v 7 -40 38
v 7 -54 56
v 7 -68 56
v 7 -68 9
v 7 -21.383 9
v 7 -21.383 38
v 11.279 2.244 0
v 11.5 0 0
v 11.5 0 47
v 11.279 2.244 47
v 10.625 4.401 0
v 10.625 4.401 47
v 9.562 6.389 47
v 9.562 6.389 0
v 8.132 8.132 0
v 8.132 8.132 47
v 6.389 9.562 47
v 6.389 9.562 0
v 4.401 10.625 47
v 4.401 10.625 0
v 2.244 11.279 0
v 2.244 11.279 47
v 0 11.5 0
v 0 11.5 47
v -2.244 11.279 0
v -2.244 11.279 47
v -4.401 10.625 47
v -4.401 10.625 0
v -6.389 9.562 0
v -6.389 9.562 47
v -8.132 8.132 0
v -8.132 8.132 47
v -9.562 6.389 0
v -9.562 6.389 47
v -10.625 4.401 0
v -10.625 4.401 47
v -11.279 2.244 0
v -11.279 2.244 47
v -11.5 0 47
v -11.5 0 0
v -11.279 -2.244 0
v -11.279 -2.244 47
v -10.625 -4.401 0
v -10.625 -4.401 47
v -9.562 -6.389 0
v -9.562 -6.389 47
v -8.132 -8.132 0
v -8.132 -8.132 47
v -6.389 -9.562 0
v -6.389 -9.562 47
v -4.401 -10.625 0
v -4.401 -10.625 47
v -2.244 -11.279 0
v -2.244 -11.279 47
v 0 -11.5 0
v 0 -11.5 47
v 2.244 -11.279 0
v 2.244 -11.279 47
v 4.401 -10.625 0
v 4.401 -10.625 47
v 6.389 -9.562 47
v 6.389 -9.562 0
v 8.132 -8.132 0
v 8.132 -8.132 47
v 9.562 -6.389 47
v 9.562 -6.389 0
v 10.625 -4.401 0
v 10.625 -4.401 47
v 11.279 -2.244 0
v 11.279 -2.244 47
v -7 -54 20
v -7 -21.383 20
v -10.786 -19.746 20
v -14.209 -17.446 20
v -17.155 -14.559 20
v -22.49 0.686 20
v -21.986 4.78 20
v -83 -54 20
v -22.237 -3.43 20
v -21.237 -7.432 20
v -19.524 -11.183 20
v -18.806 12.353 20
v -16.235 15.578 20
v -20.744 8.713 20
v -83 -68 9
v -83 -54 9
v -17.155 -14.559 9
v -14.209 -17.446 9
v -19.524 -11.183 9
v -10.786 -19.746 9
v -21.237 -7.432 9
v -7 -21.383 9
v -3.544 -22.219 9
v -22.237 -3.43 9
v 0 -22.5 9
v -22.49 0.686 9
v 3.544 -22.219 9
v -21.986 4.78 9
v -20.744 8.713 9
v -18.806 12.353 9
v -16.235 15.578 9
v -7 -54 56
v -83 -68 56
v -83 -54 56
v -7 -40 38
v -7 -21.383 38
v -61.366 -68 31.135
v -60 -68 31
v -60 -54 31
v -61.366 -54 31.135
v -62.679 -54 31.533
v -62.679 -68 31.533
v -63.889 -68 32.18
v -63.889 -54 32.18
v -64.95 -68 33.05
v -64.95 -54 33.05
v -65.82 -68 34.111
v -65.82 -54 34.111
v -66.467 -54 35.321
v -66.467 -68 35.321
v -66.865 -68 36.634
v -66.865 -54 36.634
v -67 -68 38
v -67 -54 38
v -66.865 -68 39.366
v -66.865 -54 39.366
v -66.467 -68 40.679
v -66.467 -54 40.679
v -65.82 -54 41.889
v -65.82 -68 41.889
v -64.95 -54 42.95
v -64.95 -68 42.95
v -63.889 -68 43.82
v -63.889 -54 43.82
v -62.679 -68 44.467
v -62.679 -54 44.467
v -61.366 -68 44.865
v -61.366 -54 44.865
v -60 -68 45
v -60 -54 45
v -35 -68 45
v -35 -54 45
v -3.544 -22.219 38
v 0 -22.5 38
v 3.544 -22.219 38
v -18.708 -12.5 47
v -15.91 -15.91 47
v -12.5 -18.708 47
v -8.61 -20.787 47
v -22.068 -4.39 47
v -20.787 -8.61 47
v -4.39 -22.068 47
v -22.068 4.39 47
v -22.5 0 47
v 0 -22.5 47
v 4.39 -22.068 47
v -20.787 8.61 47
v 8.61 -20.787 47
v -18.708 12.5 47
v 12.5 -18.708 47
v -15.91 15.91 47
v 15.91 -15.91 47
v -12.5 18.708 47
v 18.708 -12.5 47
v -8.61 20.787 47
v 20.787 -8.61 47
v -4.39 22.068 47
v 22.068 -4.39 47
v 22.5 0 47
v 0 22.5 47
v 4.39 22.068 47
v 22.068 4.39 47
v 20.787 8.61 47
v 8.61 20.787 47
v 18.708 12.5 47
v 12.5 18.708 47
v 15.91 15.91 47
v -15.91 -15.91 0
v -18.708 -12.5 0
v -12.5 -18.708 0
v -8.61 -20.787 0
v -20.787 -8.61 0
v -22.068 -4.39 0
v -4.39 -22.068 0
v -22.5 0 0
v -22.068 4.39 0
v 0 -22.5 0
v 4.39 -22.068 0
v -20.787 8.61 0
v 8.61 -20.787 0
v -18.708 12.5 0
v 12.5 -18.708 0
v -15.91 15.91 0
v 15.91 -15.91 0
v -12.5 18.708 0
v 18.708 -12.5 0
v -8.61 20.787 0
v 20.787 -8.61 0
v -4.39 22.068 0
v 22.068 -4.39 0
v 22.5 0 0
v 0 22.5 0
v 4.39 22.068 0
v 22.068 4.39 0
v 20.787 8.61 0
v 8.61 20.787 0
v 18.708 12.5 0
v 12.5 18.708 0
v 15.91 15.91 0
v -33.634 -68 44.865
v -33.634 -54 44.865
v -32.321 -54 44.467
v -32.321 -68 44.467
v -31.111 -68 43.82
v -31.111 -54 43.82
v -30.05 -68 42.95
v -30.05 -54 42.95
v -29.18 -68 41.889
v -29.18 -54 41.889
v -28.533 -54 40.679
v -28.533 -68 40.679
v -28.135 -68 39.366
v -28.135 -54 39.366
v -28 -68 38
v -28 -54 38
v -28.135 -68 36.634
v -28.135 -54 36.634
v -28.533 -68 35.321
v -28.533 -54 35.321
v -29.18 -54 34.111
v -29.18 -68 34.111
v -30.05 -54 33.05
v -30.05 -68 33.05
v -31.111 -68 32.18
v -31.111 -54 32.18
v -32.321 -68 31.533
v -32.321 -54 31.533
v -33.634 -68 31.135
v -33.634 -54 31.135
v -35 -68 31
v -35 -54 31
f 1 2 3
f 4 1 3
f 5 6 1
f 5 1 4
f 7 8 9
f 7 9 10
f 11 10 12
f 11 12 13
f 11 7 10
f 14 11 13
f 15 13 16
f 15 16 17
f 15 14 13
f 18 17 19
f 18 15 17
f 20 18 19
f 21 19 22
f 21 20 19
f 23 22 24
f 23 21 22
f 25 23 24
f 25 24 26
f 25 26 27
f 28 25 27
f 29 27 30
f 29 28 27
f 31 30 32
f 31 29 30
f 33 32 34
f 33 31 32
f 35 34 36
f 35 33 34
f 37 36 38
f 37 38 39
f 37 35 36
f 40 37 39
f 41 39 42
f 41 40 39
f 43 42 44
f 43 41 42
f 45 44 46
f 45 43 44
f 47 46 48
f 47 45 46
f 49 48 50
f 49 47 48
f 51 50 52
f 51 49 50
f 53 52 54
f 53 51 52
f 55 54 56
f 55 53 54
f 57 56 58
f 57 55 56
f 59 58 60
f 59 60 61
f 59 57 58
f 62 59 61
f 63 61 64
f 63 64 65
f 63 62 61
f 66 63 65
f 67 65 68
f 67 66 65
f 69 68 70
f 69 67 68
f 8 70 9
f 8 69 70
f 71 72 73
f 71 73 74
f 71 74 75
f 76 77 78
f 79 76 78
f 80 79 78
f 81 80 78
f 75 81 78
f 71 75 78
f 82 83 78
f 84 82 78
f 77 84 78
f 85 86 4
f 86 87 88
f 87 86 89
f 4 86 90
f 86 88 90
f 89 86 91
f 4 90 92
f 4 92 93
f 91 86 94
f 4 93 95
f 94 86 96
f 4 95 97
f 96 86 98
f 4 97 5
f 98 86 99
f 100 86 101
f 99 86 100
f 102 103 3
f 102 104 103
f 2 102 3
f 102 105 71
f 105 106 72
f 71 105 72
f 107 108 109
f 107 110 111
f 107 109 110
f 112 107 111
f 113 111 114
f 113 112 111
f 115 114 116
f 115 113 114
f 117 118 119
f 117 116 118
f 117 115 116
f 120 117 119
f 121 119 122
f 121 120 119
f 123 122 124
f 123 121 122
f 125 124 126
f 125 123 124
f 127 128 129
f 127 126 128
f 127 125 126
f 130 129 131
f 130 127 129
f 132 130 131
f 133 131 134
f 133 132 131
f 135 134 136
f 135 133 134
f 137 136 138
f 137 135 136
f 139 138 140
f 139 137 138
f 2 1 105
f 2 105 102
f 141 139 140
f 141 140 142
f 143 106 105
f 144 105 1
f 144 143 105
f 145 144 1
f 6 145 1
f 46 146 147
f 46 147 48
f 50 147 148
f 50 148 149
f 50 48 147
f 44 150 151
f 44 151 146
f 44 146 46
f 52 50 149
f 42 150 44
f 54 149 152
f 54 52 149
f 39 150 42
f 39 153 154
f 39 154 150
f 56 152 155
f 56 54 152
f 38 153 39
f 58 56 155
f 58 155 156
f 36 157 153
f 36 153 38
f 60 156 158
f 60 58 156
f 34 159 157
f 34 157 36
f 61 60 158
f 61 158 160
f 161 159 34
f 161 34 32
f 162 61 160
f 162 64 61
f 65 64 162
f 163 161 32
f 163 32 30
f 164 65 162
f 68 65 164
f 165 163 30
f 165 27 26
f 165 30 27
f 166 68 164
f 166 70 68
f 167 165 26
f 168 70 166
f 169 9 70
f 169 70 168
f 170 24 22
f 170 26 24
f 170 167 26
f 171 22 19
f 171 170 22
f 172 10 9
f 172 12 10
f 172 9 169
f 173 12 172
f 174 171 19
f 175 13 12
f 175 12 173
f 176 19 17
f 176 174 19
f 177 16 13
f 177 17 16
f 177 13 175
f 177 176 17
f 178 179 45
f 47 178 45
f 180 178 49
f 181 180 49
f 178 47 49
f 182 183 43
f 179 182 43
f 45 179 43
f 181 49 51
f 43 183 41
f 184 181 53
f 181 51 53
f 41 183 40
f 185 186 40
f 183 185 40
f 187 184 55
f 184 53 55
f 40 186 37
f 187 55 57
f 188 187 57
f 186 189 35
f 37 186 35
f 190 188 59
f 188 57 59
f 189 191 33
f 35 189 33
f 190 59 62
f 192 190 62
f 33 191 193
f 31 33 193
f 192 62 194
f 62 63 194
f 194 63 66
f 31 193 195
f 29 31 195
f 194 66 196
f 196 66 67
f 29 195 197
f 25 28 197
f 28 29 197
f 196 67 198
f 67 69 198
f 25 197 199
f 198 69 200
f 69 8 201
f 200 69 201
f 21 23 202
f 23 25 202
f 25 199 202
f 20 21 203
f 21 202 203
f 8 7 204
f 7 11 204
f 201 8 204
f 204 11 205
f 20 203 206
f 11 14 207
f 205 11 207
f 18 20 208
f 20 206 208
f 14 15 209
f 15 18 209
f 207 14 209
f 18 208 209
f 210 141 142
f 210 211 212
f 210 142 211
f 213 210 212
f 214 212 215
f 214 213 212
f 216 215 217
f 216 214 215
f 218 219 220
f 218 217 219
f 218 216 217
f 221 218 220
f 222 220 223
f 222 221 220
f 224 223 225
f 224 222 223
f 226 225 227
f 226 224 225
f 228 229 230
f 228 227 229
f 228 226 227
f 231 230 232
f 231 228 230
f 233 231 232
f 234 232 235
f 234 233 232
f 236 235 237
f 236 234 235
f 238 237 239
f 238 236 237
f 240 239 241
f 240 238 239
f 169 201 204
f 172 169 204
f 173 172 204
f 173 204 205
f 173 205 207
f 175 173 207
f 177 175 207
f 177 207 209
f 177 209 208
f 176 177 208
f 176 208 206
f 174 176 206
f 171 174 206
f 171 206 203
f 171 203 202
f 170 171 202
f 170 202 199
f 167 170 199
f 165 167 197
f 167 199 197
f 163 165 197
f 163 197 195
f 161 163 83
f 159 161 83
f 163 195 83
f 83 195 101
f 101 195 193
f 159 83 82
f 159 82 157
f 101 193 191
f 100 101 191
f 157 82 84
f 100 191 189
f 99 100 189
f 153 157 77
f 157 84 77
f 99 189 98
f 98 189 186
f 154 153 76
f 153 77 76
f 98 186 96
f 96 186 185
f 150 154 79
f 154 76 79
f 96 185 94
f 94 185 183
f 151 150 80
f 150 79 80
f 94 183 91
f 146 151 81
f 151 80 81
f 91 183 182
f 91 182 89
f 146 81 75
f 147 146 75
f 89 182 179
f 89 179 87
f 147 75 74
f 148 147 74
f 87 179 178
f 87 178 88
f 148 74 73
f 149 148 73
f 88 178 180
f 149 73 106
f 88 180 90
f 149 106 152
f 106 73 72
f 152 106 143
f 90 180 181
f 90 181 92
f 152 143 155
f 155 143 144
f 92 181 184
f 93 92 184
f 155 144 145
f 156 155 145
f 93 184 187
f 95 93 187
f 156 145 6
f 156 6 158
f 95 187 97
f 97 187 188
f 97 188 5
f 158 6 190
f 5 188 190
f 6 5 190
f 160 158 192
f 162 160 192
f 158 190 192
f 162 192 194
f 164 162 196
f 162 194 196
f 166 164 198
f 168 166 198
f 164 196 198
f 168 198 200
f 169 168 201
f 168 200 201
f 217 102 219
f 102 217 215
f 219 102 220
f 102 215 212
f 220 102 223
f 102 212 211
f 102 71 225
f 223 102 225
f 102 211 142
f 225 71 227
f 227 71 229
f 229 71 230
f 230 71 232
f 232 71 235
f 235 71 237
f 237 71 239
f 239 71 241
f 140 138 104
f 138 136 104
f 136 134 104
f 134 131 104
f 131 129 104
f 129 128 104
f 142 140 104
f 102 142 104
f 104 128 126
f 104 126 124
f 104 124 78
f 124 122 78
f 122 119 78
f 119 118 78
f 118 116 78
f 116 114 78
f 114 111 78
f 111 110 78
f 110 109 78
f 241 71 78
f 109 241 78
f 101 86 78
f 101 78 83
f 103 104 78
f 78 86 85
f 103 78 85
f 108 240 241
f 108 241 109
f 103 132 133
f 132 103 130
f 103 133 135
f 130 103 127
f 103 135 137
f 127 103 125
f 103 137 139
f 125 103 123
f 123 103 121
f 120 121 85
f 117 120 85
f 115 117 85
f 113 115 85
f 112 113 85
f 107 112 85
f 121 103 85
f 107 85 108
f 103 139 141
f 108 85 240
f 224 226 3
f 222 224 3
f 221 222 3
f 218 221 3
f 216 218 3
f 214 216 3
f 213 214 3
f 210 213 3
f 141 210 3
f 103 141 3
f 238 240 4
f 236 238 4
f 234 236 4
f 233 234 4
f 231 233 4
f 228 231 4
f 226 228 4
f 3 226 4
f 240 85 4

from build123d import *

# Parameters (mm, degrees)
SKETCH_1_R          = 22.5
SKETCH_1_R_2        = 11.5
EXTRUDE_1_DEPTH     = 47
EXTRUDE_2_DEPTH     = 47
EXTRUDE_3_DEPTH     = 11
EXTRUDE_10_DEPTH    = 29
EXTRUDE_11_DEPTH    = 14
CUT_EXTRUDE_1_DEPTH = 138


with BuildPart() as part:
    # 草图1 → 凸台-拉伸1 (new body)
    with BuildSketch(Plane.XY):
        Circle(SKETCH_1_R)
        Circle(SKETCH_1_R_2, mode=Mode.SUBTRACT)
    extrude(amount=EXTRUDE_1_DEPTH)



with BuildPart() as body_2:
    # 草图3 → 凸台-拉伸2 (new body)
    with BuildSketch(Plane.XY.offset(9)):
        Polygon((-83, -68), (0, -68), (7, -68), (7, -54), (-83, -54), align=None)
    extrude(amount=EXTRUDE_2_DEPTH)


with BuildPart() as part_1:
    add(part.part)

    add(body_2.part)  # 凸台-拉伸3 merges body 2
    # 草图4 → 凸台-拉伸3 (add)
    with BuildSketch(Plane.XY.offset(9)):
        with BuildLine():
            Line((-83, -54), (-16.234704276, 15.578330368))
            ThreePointArc((-16.234704276, 15.578330368), (-21.829002199, -5.453866793), (-7, -21.38340478))
            Line((-7, -21.38340478), (-7, -54))
            Line((-7, -54), (-83, -54))
        make_face()
    extrude(amount=EXTRUDE_3_DEPTH)

    # 草图6 → 凸台-拉伸10 (add)
    with BuildSketch(Plane.XY.offset(9)):
        with BuildLine():
            Line((-7, -21.38340478), (-7, -54))
            Line((-7, -54), (7, -54))
            Line((7, -54), (7, -21.38340478))
            ThreePointArc((7, -21.38340478), (0, -22.5), (-7, -21.38340478))
        make_face()
    extrude(amount=EXTRUDE_10_DEPTH)

    # 草图7 → 凸台-拉伸11 (add)
    with BuildSketch(Plane(origin=(7, 0, 0), x_dir=(0, 0, -1), z_dir=(1, 0, 0))):
        Polygon((-38, -54), (-38, -40), (-56, -54), align=None)
    extrude(amount=-EXTRUDE_11_DEPTH)

    # 草图8 → 切除-拉伸1 (cut)
    with BuildSketch(Plane(origin=(0, -168, 0), x_dir=(-1, 0, 0), z_dir=(0, -1, 0))):
        with BuildLine():
            Line((60, -45), (35, -45))
            ThreePointArc((35, -45), (28, -38), (35, -31))
            Line((35, -31), (60, -31))
            ThreePointArc((60, -31), (67, -38), (60, -45))
        make_face()
    extrude(amount=-CUT_EXTRUDE_1_DEPTH, mode=Mode.SUBTRACT)


solid = part_1.part
